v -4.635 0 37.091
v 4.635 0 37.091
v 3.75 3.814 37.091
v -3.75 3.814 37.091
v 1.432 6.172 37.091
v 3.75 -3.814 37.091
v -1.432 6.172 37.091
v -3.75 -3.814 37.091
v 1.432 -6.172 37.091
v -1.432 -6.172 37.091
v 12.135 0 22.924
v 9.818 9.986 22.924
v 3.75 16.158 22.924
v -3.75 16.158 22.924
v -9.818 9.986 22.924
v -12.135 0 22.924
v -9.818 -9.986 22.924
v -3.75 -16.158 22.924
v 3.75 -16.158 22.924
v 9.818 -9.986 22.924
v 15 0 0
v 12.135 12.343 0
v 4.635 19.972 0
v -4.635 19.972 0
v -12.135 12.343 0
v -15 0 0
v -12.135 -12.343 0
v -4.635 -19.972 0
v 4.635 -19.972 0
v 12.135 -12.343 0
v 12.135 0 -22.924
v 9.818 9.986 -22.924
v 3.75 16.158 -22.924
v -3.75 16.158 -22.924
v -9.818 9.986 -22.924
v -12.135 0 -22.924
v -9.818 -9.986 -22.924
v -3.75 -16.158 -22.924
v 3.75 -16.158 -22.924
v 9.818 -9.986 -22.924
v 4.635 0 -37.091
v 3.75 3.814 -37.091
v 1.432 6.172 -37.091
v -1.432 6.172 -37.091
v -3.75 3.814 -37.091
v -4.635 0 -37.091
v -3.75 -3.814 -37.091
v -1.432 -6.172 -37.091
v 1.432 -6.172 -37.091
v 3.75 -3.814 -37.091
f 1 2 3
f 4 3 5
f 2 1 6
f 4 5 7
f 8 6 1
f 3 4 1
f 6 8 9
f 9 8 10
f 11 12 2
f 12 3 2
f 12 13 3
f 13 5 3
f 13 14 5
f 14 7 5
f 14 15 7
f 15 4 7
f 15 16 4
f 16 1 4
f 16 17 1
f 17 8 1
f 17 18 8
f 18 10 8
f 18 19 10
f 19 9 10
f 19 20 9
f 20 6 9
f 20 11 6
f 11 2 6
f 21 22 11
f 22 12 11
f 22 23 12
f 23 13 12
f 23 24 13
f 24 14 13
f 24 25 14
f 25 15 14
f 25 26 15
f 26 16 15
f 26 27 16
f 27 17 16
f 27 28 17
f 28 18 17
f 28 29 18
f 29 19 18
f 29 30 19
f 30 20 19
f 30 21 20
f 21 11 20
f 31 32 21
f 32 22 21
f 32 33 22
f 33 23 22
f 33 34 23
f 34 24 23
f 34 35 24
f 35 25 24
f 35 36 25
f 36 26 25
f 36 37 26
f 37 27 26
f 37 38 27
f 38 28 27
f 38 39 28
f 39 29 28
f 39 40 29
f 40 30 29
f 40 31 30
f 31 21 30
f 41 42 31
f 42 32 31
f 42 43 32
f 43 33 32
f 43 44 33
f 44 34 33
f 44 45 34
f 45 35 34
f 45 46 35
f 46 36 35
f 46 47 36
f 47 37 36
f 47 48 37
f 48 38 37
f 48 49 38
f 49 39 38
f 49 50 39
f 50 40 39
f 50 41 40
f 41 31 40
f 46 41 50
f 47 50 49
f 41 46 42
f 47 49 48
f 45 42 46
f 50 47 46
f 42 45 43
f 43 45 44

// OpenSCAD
// Generated by SolidPython 1.0.1 on 2020-07-29 00:46:46


scale(v = [5, 7, 13]) {
	sphere(r = 3);
}
/***********************************************
*********      SolidPython code:      **********
************************************************
 
# import packages: SolidPython
from solid import *
from solid.utils import *
from itertools import chain, combinations, permutations


class Resize:

    def __init__(self, scad_file):
        self.scad_file = scad_file
        #self.scad_file = import_scad(scad_file)
        # cone/cylinder param:
        self.r1 = 0
        self.r2 = 0
        self.h = 0
        # rectangular prism param:
        self.w = 0
        self.l = 0
        # ellipse param:
        self.r = 0

    # import OpenScad code (file name corresponds to shape)


    # classify shape + parameters
    def assign(self, param1, param2, param3):
        if self.scad_file == 'cone.scad':
            self.r1 = param1
            self.r2 = param2
            self.h = param3
        elif self.scad_file == 'cylinder.scad':
            self.r1 = param1
            self.r2 = param2
            self.h = param3
        elif self.scad_file == 'rectangularPrism.scad':
            self.h = param1
            self.l = param2
            self.w = param3
        else:
            self.r = param1
            self.h = param2

    # resize parameters
    def iterate(self):
        x = range(3, 20, 2)
        i = 1
        if self.scad_file == 'cone.scad':
            tempList = list(permutations(x, 2))
            for temp in tempList:
                param1 = temp[0]
                param2 = temp[1]
                filepath = 'produced_scad_files/' + 'cone' + str(param1) + '_' + str(param2) + '_' + '.scad'
                scad_render_to_file(cylinder(h=param1, r1=param2, r2=0), filepath)

        elif self.scad_file == 'cylinder.scad':
            tempList = list(permutations(x, 3))
            for temp in tempList:
                param1 = temp[0]
                param2 = temp[1]
                filepath = 'produced_scad_files/' + 'cylinder' + str(param1) + '_' + str(param2) + '_' + '.scad'
                scad_render_to_file(cylinder(h=param1, r1=param2, r2=param2), filepath)

        elif self.scad_file == 'rectangularPrism.scad':
            tempList = list(permutations(x, 3))
            for temp in tempList:
                param1 = temp[0]
                param2 = temp[1]
                param3 = temp[2]
                filepath = 'produced_scad_files/' + 'rectangularPrism' + str(param1) + '_' + str(param2) + '_' + str(
                    param3) + '.scad'
                scad_render_to_file(cube(size=(param1, param2, param3)), filepath)

        elif self.scad_file == 'ellipse.scad':
            tempList = list(permutations(x, 4))
            for temp in tempList:
                param1 = temp[0]
                param2 = temp[1]
                param3 = temp[2]
                param4 = temp[3]
                filepath = 'produced_scad_files/' + 'ellipse' + str(param1) + '_' + str(param2) + '_' + str(param3) + '_' + str(param4) + '.scad'
                scad_render_to_file(scale([param1, param2, param3])(sphere(r=param4)), filepath)

    def render_to_scadfile(self):
        scad_render_to_file(scad, 'example.scad') 
 
************************************************/
